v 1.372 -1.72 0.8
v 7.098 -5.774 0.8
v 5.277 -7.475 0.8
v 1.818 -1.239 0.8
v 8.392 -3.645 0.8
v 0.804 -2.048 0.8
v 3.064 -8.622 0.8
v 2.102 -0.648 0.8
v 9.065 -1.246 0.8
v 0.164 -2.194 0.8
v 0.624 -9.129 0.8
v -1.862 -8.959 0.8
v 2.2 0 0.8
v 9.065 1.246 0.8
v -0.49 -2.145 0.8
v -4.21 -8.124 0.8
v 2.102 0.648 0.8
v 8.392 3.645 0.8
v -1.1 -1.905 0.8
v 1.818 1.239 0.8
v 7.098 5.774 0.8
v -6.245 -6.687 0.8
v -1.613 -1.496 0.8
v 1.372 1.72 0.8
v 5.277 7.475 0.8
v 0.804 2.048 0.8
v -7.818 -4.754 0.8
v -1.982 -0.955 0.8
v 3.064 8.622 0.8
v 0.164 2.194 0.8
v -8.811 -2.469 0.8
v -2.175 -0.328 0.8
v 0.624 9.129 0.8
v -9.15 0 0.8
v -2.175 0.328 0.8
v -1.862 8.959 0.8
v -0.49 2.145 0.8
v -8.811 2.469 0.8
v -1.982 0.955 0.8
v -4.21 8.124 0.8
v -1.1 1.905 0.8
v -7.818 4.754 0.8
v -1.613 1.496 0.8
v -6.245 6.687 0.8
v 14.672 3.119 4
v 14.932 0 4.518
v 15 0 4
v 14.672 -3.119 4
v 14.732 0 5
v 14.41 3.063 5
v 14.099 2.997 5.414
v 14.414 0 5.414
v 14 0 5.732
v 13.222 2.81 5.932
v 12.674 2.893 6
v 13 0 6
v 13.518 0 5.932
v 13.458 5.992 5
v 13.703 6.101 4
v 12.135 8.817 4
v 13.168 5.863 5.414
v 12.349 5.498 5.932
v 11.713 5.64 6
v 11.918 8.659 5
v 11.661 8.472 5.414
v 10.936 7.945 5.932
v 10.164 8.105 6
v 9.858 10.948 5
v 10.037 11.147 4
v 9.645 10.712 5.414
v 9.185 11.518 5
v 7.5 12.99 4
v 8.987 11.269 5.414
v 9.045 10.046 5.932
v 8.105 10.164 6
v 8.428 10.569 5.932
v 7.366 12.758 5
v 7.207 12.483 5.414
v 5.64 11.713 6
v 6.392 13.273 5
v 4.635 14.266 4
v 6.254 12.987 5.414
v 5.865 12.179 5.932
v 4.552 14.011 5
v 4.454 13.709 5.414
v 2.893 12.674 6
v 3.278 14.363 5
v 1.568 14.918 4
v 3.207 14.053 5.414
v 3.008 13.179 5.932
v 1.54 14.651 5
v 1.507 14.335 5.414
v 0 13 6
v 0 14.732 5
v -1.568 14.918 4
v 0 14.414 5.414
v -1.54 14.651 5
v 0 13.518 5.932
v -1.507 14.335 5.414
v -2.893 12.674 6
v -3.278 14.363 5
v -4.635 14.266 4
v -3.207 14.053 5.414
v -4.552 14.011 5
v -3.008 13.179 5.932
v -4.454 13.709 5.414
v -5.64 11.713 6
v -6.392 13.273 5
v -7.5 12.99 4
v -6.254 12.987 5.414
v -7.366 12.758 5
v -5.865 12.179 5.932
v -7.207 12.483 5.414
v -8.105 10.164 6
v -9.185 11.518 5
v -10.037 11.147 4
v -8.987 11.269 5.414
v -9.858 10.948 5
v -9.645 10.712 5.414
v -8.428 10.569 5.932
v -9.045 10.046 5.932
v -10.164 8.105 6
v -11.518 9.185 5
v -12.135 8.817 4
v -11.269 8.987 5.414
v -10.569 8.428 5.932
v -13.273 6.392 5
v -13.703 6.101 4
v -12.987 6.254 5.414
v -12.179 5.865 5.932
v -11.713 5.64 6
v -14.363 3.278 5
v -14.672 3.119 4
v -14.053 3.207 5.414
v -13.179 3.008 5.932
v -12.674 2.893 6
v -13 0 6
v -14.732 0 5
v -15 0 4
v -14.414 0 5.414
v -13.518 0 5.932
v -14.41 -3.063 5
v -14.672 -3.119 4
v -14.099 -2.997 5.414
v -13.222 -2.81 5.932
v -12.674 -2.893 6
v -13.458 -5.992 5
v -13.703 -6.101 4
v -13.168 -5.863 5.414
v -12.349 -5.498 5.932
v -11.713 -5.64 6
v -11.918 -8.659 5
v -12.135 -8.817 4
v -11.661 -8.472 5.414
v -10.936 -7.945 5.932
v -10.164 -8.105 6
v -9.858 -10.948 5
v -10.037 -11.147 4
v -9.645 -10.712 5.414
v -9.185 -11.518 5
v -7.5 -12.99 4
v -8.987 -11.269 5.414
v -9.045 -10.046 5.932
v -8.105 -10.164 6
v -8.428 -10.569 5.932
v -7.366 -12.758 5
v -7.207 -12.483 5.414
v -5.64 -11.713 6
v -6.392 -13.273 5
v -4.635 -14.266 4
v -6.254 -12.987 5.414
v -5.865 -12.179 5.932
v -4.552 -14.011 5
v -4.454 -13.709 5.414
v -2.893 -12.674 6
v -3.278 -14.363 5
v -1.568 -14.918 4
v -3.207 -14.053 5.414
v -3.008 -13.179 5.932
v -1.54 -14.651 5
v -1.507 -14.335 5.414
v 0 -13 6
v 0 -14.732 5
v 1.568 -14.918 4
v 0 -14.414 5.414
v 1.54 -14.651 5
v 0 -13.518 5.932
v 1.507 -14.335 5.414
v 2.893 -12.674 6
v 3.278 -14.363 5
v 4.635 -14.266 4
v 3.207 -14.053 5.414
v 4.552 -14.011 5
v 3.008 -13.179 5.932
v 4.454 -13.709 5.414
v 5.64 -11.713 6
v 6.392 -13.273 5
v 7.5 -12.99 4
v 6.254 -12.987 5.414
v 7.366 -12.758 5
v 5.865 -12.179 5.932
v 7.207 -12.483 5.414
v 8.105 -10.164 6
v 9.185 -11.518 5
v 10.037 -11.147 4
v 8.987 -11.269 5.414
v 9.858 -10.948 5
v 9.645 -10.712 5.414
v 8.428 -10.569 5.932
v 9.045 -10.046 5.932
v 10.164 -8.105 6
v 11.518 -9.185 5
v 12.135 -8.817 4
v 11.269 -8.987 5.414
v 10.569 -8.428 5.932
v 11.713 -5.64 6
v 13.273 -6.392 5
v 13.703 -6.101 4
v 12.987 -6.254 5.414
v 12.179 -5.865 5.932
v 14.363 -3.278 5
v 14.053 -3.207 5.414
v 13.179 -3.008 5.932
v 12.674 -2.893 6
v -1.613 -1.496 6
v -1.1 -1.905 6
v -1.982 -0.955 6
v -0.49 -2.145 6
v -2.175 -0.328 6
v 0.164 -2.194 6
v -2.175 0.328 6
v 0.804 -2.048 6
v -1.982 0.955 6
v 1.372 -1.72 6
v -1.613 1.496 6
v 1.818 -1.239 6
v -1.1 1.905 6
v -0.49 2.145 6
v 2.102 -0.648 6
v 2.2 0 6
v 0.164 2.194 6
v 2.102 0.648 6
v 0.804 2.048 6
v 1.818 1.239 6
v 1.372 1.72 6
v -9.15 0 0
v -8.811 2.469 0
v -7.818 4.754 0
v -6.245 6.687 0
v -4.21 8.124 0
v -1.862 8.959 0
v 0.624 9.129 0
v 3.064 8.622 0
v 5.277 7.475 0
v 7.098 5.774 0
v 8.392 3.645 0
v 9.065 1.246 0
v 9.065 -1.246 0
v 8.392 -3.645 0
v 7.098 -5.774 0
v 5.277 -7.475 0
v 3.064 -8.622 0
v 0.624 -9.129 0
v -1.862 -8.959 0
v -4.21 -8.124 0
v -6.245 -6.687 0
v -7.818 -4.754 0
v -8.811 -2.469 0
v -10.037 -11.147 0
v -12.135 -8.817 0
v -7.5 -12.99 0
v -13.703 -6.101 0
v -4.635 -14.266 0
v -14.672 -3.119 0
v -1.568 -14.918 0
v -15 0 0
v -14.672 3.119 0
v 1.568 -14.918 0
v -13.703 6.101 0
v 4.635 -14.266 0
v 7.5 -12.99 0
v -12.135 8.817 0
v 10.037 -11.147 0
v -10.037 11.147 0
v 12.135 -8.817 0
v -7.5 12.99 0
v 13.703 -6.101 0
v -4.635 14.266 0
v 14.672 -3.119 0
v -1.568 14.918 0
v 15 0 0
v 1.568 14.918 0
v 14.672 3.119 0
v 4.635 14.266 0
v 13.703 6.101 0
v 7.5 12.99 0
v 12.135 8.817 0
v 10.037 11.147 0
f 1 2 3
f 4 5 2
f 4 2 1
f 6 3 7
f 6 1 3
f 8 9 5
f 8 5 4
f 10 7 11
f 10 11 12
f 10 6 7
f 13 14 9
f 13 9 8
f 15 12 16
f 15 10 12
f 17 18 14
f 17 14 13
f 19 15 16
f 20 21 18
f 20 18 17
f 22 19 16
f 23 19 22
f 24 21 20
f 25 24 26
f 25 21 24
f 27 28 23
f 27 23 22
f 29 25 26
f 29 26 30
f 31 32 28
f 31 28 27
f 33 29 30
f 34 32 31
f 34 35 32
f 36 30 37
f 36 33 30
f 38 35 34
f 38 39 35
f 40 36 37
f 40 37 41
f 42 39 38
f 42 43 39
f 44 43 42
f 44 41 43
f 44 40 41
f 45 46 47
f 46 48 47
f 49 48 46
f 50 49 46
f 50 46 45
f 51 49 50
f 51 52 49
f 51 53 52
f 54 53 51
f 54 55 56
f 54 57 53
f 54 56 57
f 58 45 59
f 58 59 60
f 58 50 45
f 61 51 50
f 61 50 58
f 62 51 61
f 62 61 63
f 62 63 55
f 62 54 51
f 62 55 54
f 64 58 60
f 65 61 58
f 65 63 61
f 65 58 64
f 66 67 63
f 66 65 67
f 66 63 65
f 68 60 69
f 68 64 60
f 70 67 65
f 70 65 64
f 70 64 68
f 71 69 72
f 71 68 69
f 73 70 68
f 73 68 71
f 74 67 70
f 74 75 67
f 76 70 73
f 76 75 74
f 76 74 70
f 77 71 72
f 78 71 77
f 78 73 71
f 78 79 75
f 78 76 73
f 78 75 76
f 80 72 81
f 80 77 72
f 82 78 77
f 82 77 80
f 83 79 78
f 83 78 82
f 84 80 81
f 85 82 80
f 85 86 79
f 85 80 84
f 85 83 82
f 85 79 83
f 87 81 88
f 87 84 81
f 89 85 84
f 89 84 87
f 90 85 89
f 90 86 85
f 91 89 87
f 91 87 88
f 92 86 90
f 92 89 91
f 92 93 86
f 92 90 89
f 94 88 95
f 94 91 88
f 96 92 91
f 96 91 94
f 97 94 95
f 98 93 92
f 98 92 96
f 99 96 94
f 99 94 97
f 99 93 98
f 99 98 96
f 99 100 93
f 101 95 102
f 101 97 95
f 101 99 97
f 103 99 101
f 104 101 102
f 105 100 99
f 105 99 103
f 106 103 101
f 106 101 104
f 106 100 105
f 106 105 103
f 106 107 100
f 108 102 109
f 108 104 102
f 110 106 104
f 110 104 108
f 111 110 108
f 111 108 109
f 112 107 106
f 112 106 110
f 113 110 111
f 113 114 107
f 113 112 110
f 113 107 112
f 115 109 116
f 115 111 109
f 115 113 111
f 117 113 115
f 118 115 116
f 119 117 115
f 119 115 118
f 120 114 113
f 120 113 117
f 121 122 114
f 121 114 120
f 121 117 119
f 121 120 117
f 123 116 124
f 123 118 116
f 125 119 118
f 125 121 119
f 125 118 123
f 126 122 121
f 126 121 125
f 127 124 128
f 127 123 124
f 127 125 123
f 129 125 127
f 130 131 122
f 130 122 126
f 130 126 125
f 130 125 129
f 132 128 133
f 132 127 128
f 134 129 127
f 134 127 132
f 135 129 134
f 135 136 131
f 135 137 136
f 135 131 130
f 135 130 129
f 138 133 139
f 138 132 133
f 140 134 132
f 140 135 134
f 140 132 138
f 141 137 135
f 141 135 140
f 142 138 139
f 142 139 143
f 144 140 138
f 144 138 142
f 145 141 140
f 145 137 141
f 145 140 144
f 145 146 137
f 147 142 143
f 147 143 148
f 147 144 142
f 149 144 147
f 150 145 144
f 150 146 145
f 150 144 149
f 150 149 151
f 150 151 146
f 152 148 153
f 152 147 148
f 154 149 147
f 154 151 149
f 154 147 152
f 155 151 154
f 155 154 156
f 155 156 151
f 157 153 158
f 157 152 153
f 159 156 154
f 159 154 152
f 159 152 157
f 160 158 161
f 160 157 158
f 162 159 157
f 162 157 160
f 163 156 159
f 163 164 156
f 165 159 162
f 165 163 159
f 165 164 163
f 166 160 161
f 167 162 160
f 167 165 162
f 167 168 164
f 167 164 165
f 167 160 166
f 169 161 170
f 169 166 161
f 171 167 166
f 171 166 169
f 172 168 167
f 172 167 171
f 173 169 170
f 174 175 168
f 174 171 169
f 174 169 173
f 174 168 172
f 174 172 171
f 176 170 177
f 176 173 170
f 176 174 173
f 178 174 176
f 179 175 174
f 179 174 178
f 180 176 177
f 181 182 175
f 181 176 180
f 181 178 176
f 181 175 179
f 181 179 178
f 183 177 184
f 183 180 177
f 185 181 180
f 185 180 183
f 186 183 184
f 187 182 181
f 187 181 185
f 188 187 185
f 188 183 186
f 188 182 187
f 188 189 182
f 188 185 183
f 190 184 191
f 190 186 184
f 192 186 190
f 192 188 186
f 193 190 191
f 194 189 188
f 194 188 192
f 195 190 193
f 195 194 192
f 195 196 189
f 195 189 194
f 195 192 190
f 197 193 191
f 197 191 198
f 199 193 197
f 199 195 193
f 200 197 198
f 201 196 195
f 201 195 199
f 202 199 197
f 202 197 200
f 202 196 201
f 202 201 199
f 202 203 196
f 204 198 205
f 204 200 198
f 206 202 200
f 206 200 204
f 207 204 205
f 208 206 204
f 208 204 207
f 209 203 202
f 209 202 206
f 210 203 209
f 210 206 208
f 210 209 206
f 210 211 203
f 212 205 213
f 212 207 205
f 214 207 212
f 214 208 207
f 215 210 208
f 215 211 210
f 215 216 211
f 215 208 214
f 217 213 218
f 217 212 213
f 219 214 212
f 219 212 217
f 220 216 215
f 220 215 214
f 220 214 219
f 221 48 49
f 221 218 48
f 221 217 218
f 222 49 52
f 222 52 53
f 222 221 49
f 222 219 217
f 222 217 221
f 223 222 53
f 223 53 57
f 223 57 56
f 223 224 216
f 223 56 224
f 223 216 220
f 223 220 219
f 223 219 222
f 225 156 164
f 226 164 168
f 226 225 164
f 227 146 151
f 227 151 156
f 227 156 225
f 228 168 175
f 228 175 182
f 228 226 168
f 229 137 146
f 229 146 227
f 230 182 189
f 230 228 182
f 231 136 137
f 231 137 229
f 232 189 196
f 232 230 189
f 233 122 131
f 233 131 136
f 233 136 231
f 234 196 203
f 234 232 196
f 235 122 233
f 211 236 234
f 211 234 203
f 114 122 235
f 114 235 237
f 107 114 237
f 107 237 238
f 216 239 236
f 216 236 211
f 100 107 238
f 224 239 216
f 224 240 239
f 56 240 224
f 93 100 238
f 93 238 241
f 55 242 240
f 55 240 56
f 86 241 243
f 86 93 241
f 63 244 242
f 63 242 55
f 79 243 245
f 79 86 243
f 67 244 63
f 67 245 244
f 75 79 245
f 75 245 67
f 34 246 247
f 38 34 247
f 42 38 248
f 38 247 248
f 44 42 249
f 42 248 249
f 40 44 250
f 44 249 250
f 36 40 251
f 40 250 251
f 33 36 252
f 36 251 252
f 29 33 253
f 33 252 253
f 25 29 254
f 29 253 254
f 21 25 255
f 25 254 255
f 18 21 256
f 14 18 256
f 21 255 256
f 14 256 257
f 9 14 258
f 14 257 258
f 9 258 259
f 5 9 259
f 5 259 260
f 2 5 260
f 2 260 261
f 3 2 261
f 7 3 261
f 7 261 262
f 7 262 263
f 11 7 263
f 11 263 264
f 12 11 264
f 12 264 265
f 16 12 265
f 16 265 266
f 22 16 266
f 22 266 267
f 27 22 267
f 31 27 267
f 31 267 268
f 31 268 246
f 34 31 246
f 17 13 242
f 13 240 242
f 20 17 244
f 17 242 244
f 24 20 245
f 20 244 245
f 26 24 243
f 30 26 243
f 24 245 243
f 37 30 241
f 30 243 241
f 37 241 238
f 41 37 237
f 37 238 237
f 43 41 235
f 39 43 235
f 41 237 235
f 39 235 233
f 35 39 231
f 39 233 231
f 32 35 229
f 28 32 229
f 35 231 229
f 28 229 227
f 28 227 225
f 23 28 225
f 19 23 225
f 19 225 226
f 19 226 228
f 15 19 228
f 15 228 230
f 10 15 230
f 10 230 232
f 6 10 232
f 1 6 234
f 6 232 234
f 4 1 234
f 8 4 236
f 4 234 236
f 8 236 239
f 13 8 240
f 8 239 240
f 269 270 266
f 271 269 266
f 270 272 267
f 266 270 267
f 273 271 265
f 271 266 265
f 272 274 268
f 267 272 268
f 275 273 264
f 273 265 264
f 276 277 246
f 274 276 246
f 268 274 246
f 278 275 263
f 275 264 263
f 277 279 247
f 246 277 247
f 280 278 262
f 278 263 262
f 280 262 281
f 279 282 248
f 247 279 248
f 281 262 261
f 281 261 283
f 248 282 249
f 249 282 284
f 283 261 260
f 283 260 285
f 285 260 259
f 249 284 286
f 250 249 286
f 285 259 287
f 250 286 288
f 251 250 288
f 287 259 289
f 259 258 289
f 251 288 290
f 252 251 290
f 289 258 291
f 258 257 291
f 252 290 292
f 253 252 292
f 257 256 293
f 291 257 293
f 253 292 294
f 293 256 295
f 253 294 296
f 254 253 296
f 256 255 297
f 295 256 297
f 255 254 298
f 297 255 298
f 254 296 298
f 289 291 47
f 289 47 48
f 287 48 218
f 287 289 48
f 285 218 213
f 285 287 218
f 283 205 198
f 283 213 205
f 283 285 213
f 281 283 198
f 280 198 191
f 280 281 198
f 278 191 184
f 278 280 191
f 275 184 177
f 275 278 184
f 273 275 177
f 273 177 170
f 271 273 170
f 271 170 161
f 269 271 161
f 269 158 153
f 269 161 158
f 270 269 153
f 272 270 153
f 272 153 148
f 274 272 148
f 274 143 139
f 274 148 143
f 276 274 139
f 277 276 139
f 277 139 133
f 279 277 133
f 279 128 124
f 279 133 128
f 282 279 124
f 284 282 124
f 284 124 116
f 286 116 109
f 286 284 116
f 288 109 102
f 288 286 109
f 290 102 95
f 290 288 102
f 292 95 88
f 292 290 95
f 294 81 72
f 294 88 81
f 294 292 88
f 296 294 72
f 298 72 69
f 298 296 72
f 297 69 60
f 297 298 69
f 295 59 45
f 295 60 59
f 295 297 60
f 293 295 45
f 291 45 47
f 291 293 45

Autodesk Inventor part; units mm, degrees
ref_plane "YZ Plane" through (0, 0, 0) normal (1, 0, 0) x (0, 1, 0)
ref_plane "XZ Plane" through (0, 0, 0) normal (0, 1, 0) x (-1, 0, 0)
ref_plane "XY Plane" through (0, 0, 0) normal (0, 0, 1) x (1, 0, 0)
sketch "Эскиз1" plane through (0, 0, 0) normal (0, 0, 1) x (1, 0, 0)
  circle A0 centre (0, 0) radius 15
  circle A1 centre (0, 6.5) radius 1.35 construction
  circle A2 centre (-5.6292, -3.25) radius 1.35 construction
  circle A3 centre (5.6292, -3.25) radius 1.35 construction
  circle A4 centre (0, 0) radius 1.1
  dimension "d0" = 30
  dimension "d1" = 2.7
  dimension "d2" = 6.5
  dimension "d5" = 360
  dimension "d21" = 2.2
extrude "Выдавливание1" add sketch "Эскиз1" along normal blind 6 contours A0 | A4
fillet "Сопряжение1" radius 2 1 edges at (-15, 0, 6)
sketch "Эскиз4" plane through (0, 0, 6) normal (0, 0, 1) x (1, 0, 0)
  circle A0 centre (0, 0) radius 2.2
  dimension "d22" = 4.4
extrude "Выдавливание4" cut sketch "Эскиз4" against normal blind 10
sketch "Эскиз5" plane through (0, 0, 0) normal (0, 0, -1) x (-1, 0, 0)
  circle A0 centre (0, 0) radius 9.15
  dimension "d28" = 18.3
extrude "Выдавливание5" cut sketch "Эскиз5" against normal blind 0.8
properties part number "крышка"
